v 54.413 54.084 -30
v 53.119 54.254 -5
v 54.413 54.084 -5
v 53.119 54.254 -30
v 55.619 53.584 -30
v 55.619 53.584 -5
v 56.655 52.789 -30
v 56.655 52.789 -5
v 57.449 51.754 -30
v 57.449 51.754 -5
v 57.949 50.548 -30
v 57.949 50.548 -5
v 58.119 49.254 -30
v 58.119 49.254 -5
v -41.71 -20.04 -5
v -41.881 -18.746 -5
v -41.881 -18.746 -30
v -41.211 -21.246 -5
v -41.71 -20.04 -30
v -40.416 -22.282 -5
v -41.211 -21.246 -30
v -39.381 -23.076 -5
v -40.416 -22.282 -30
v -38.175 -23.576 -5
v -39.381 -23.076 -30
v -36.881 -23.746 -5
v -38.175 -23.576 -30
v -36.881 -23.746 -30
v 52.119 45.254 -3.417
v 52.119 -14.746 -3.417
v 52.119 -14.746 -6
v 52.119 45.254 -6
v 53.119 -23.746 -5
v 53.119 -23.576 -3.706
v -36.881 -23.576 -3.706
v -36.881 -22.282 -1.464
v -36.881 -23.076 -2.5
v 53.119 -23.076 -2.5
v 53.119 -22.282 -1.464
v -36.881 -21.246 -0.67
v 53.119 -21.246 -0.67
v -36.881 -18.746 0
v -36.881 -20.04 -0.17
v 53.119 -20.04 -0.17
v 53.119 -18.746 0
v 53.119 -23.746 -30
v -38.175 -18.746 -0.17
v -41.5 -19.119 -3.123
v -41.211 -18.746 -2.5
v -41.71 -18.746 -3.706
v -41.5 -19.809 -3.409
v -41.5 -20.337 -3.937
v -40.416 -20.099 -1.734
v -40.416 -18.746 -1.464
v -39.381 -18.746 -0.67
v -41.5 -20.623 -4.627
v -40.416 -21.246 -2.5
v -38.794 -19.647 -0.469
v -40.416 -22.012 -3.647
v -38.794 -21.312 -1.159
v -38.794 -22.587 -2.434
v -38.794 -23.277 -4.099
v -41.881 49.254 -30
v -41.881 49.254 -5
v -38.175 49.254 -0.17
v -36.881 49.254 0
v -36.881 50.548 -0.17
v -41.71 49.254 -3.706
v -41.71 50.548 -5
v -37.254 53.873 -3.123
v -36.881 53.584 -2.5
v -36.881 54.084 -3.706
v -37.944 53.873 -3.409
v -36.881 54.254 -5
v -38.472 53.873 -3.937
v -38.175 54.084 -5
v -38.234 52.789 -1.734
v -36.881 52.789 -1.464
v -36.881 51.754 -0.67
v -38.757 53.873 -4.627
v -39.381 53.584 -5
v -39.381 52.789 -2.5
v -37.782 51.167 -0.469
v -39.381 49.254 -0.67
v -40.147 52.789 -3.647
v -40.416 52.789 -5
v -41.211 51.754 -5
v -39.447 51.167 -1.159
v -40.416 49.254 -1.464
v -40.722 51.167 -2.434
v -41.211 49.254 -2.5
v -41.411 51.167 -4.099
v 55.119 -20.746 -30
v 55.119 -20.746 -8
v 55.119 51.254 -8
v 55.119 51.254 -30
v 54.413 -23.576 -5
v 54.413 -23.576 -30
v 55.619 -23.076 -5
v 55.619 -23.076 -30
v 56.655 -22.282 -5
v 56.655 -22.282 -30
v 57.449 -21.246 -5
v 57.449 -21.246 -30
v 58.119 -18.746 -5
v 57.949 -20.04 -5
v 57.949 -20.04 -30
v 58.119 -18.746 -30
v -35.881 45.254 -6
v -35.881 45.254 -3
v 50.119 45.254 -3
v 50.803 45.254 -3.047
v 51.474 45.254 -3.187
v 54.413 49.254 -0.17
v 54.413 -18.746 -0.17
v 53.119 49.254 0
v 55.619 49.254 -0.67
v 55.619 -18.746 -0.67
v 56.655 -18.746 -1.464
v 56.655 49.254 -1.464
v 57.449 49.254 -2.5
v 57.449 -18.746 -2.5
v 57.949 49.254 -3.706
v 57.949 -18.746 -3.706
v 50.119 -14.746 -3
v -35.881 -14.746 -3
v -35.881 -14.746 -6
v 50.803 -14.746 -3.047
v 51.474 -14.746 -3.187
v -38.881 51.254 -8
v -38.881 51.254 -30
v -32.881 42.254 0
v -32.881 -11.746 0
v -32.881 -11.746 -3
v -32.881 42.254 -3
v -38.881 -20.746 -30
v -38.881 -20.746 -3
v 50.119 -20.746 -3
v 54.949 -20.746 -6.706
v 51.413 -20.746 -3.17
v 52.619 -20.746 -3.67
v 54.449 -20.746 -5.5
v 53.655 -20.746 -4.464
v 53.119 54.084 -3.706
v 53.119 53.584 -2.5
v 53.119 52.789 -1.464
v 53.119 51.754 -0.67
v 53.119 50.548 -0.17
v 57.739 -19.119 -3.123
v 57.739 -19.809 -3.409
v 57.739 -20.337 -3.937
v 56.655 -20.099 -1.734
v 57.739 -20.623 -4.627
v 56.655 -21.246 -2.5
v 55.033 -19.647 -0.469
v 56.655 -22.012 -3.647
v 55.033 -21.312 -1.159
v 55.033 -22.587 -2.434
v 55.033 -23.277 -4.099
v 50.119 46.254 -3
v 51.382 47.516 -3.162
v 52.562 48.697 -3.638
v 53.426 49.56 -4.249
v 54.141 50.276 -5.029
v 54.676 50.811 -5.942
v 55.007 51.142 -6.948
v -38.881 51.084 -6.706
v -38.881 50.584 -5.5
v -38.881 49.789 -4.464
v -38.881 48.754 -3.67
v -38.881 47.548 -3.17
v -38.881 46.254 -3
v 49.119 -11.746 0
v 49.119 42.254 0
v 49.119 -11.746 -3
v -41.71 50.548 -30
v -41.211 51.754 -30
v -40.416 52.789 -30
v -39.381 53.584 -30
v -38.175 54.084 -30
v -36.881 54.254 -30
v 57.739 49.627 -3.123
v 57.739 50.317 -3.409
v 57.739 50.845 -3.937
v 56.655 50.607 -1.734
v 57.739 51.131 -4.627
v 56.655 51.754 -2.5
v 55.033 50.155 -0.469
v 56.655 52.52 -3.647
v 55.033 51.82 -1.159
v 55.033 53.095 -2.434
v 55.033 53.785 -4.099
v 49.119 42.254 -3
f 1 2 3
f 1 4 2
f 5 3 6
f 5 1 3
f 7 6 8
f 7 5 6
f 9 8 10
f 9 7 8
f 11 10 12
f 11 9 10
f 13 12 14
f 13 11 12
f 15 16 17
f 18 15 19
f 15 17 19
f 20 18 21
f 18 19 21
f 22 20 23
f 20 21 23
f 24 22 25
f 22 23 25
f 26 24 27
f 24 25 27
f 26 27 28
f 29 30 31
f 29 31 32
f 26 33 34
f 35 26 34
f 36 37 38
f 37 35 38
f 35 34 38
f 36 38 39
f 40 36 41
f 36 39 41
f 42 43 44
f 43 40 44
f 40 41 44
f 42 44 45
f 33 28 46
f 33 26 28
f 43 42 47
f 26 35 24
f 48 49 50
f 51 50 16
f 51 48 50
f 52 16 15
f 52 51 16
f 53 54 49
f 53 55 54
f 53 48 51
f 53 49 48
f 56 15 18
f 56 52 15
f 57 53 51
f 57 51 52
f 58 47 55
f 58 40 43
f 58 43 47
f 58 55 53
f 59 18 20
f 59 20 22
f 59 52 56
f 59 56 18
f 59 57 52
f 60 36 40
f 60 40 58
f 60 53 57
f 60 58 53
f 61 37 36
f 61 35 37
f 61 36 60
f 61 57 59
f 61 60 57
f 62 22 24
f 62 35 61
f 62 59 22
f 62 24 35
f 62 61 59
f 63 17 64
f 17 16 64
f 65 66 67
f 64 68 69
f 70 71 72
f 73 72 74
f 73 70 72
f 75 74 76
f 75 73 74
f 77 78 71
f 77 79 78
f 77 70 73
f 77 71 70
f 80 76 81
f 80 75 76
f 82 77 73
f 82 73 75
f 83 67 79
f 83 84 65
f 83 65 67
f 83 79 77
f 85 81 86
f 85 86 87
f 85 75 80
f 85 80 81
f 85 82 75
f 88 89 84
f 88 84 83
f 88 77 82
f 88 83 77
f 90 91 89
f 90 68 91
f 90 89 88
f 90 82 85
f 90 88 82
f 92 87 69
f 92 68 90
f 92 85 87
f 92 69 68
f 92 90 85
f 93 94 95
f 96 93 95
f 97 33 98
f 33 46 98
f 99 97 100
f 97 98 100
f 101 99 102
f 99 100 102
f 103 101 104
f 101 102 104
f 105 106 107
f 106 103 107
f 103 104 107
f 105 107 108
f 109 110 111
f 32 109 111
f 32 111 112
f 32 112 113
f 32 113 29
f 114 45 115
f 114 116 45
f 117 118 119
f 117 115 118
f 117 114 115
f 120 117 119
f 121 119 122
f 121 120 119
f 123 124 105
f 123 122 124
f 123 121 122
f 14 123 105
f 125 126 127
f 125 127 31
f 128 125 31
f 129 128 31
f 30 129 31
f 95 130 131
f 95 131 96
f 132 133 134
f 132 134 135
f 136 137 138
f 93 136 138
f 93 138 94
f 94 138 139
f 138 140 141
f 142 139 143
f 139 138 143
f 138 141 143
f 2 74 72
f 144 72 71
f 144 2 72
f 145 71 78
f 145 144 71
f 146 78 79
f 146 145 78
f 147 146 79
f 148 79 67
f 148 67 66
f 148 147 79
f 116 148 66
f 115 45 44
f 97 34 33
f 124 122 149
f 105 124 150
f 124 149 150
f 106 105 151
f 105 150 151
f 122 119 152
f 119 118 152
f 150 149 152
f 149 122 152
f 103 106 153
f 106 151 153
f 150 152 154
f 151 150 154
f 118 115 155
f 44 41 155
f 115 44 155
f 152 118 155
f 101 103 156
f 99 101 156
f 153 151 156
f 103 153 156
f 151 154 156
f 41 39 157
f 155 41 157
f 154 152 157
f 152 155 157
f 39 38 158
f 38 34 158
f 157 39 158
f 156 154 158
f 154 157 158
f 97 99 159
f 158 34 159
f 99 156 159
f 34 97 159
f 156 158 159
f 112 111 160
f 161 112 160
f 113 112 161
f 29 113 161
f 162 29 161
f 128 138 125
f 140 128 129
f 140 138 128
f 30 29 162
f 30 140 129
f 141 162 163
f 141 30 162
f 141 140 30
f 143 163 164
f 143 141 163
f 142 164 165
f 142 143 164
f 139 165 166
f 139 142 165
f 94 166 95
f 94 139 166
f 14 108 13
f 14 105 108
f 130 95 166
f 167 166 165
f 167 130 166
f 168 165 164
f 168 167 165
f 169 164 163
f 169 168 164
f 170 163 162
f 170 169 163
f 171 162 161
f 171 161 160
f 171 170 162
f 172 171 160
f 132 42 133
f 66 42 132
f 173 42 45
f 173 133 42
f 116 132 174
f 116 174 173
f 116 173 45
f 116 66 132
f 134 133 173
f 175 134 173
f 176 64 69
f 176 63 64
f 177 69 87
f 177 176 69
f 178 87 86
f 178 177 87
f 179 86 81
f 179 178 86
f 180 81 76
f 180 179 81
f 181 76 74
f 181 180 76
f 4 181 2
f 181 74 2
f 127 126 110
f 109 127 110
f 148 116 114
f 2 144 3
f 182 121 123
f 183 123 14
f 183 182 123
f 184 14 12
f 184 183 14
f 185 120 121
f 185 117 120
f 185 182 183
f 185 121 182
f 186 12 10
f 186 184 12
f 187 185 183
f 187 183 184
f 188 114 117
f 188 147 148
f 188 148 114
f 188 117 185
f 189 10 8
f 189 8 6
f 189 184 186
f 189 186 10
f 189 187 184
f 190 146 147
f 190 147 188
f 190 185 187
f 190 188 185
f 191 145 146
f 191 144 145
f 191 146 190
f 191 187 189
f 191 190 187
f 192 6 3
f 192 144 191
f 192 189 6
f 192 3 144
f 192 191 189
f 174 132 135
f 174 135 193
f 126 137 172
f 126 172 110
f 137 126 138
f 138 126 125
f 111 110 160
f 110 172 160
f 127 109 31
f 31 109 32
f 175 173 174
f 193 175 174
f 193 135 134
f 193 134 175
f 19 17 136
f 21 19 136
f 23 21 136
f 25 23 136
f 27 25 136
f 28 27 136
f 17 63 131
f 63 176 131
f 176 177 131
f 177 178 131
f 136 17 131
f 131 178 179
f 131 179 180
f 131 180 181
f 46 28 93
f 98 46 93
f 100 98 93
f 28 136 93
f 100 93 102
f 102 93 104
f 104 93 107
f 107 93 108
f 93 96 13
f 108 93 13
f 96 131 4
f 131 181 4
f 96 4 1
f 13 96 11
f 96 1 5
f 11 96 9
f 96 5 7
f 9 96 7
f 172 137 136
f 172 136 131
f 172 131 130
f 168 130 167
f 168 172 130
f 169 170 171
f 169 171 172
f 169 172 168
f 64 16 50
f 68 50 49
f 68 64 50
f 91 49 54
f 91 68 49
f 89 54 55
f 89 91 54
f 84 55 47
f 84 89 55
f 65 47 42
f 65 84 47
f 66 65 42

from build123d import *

# Parameters (mm, degrees)
SKETCH1_W           = 100
SKETCH1_H           = 78
BOSS_EXTRUDE1_DEPTH = 30
SKETCH3_W           = 82
SKETCH3_H           = 54
CUT_EXTRUDE1_DEPTH  = 3
SHELL1_T            = -3
FILLET1_R           = 5
FILLET2_R           = 5


with BuildPart() as part:
    # Sketch1 → Boss-Extrude1 (new body)
    with BuildSketch(Plane.XY):
        with Locations((8.119223597, 15.253918495)):
            Rectangle(SKETCH1_W, SKETCH1_H)
    extrude(amount=-BOSS_EXTRUDE1_DEPTH)

    # Sketch3 → Cut-Extrude1 (cut)
    with BuildSketch(Plane.XY):
        with Locations((8.119223597, 15.253918495)):
            Rectangle(SKETCH3_W, SKETCH3_H)
    extrude(amount=-CUT_EXTRUDE1_DEPTH, mode=Mode.SUBTRACT)

    # Shell1
    shell1_openings = [part.faces().sort_by_distance(p)[0] for p in [
        (8.119223597, 15.253918495, -30),
    ]]
    offset(amount=SHELL1_T, openings=shell1_openings, kind=Kind.INTERSECTION)

    # Fillet1
    fillet1_edges = [part.edges().sort_by_distance(p)[0] for p in [
        (8.119223597, -23.746081505, 0),
        (-41.880776403, 15.253918495, 0),
        (8.119223597, 54.253918495, 0),
        (58.119223597, 15.253918495, 0),
        (58.119223597, -23.746081505, -15),
        (-41.880776403, -23.746081505, -15),
        (-41.880776403, 54.253918495, -15),
        (58.119223597, 54.253918495, -15),
    ]]
    fillet(fillet1_edges, radius=FILLET1_R)

    # Fillet2
    # the kernel refuses this fillet: 5 mm, written as the material it adds along each edge
    with BuildSketch(Plane(origin=(55.119223597, -20.746081505, -3), x_dir=(0, 0, -1), z_dir=(0, 1, 0))) as fillet2_piece_1:
        with BuildLine():
            CenterArc((FILLET2_R, FILLET2_R), FILLET2_R, 180, 90)
            Line((0, FILLET2_R), (0, 0))
            Line((0, 0), (FILLET2_R, 0))
        make_face()
    extrude(amount=72)
    with BuildSketch(Plane(origin=(-38.880776403, 51.253918495, -3), x_dir=(0, 0, -1), z_dir=(1, 0, 0))) as fillet2_piece_2:
        with BuildLine():
            CenterArc((FILLET2_R, -FILLET2_R), FILLET2_R, 90, 90)
            Line((0, -FILLET2_R), (0, 0))
            Line((0, 0), (FILLET2_R, 0))
        make_face()
    extrude(amount=94)


solid = part.part
